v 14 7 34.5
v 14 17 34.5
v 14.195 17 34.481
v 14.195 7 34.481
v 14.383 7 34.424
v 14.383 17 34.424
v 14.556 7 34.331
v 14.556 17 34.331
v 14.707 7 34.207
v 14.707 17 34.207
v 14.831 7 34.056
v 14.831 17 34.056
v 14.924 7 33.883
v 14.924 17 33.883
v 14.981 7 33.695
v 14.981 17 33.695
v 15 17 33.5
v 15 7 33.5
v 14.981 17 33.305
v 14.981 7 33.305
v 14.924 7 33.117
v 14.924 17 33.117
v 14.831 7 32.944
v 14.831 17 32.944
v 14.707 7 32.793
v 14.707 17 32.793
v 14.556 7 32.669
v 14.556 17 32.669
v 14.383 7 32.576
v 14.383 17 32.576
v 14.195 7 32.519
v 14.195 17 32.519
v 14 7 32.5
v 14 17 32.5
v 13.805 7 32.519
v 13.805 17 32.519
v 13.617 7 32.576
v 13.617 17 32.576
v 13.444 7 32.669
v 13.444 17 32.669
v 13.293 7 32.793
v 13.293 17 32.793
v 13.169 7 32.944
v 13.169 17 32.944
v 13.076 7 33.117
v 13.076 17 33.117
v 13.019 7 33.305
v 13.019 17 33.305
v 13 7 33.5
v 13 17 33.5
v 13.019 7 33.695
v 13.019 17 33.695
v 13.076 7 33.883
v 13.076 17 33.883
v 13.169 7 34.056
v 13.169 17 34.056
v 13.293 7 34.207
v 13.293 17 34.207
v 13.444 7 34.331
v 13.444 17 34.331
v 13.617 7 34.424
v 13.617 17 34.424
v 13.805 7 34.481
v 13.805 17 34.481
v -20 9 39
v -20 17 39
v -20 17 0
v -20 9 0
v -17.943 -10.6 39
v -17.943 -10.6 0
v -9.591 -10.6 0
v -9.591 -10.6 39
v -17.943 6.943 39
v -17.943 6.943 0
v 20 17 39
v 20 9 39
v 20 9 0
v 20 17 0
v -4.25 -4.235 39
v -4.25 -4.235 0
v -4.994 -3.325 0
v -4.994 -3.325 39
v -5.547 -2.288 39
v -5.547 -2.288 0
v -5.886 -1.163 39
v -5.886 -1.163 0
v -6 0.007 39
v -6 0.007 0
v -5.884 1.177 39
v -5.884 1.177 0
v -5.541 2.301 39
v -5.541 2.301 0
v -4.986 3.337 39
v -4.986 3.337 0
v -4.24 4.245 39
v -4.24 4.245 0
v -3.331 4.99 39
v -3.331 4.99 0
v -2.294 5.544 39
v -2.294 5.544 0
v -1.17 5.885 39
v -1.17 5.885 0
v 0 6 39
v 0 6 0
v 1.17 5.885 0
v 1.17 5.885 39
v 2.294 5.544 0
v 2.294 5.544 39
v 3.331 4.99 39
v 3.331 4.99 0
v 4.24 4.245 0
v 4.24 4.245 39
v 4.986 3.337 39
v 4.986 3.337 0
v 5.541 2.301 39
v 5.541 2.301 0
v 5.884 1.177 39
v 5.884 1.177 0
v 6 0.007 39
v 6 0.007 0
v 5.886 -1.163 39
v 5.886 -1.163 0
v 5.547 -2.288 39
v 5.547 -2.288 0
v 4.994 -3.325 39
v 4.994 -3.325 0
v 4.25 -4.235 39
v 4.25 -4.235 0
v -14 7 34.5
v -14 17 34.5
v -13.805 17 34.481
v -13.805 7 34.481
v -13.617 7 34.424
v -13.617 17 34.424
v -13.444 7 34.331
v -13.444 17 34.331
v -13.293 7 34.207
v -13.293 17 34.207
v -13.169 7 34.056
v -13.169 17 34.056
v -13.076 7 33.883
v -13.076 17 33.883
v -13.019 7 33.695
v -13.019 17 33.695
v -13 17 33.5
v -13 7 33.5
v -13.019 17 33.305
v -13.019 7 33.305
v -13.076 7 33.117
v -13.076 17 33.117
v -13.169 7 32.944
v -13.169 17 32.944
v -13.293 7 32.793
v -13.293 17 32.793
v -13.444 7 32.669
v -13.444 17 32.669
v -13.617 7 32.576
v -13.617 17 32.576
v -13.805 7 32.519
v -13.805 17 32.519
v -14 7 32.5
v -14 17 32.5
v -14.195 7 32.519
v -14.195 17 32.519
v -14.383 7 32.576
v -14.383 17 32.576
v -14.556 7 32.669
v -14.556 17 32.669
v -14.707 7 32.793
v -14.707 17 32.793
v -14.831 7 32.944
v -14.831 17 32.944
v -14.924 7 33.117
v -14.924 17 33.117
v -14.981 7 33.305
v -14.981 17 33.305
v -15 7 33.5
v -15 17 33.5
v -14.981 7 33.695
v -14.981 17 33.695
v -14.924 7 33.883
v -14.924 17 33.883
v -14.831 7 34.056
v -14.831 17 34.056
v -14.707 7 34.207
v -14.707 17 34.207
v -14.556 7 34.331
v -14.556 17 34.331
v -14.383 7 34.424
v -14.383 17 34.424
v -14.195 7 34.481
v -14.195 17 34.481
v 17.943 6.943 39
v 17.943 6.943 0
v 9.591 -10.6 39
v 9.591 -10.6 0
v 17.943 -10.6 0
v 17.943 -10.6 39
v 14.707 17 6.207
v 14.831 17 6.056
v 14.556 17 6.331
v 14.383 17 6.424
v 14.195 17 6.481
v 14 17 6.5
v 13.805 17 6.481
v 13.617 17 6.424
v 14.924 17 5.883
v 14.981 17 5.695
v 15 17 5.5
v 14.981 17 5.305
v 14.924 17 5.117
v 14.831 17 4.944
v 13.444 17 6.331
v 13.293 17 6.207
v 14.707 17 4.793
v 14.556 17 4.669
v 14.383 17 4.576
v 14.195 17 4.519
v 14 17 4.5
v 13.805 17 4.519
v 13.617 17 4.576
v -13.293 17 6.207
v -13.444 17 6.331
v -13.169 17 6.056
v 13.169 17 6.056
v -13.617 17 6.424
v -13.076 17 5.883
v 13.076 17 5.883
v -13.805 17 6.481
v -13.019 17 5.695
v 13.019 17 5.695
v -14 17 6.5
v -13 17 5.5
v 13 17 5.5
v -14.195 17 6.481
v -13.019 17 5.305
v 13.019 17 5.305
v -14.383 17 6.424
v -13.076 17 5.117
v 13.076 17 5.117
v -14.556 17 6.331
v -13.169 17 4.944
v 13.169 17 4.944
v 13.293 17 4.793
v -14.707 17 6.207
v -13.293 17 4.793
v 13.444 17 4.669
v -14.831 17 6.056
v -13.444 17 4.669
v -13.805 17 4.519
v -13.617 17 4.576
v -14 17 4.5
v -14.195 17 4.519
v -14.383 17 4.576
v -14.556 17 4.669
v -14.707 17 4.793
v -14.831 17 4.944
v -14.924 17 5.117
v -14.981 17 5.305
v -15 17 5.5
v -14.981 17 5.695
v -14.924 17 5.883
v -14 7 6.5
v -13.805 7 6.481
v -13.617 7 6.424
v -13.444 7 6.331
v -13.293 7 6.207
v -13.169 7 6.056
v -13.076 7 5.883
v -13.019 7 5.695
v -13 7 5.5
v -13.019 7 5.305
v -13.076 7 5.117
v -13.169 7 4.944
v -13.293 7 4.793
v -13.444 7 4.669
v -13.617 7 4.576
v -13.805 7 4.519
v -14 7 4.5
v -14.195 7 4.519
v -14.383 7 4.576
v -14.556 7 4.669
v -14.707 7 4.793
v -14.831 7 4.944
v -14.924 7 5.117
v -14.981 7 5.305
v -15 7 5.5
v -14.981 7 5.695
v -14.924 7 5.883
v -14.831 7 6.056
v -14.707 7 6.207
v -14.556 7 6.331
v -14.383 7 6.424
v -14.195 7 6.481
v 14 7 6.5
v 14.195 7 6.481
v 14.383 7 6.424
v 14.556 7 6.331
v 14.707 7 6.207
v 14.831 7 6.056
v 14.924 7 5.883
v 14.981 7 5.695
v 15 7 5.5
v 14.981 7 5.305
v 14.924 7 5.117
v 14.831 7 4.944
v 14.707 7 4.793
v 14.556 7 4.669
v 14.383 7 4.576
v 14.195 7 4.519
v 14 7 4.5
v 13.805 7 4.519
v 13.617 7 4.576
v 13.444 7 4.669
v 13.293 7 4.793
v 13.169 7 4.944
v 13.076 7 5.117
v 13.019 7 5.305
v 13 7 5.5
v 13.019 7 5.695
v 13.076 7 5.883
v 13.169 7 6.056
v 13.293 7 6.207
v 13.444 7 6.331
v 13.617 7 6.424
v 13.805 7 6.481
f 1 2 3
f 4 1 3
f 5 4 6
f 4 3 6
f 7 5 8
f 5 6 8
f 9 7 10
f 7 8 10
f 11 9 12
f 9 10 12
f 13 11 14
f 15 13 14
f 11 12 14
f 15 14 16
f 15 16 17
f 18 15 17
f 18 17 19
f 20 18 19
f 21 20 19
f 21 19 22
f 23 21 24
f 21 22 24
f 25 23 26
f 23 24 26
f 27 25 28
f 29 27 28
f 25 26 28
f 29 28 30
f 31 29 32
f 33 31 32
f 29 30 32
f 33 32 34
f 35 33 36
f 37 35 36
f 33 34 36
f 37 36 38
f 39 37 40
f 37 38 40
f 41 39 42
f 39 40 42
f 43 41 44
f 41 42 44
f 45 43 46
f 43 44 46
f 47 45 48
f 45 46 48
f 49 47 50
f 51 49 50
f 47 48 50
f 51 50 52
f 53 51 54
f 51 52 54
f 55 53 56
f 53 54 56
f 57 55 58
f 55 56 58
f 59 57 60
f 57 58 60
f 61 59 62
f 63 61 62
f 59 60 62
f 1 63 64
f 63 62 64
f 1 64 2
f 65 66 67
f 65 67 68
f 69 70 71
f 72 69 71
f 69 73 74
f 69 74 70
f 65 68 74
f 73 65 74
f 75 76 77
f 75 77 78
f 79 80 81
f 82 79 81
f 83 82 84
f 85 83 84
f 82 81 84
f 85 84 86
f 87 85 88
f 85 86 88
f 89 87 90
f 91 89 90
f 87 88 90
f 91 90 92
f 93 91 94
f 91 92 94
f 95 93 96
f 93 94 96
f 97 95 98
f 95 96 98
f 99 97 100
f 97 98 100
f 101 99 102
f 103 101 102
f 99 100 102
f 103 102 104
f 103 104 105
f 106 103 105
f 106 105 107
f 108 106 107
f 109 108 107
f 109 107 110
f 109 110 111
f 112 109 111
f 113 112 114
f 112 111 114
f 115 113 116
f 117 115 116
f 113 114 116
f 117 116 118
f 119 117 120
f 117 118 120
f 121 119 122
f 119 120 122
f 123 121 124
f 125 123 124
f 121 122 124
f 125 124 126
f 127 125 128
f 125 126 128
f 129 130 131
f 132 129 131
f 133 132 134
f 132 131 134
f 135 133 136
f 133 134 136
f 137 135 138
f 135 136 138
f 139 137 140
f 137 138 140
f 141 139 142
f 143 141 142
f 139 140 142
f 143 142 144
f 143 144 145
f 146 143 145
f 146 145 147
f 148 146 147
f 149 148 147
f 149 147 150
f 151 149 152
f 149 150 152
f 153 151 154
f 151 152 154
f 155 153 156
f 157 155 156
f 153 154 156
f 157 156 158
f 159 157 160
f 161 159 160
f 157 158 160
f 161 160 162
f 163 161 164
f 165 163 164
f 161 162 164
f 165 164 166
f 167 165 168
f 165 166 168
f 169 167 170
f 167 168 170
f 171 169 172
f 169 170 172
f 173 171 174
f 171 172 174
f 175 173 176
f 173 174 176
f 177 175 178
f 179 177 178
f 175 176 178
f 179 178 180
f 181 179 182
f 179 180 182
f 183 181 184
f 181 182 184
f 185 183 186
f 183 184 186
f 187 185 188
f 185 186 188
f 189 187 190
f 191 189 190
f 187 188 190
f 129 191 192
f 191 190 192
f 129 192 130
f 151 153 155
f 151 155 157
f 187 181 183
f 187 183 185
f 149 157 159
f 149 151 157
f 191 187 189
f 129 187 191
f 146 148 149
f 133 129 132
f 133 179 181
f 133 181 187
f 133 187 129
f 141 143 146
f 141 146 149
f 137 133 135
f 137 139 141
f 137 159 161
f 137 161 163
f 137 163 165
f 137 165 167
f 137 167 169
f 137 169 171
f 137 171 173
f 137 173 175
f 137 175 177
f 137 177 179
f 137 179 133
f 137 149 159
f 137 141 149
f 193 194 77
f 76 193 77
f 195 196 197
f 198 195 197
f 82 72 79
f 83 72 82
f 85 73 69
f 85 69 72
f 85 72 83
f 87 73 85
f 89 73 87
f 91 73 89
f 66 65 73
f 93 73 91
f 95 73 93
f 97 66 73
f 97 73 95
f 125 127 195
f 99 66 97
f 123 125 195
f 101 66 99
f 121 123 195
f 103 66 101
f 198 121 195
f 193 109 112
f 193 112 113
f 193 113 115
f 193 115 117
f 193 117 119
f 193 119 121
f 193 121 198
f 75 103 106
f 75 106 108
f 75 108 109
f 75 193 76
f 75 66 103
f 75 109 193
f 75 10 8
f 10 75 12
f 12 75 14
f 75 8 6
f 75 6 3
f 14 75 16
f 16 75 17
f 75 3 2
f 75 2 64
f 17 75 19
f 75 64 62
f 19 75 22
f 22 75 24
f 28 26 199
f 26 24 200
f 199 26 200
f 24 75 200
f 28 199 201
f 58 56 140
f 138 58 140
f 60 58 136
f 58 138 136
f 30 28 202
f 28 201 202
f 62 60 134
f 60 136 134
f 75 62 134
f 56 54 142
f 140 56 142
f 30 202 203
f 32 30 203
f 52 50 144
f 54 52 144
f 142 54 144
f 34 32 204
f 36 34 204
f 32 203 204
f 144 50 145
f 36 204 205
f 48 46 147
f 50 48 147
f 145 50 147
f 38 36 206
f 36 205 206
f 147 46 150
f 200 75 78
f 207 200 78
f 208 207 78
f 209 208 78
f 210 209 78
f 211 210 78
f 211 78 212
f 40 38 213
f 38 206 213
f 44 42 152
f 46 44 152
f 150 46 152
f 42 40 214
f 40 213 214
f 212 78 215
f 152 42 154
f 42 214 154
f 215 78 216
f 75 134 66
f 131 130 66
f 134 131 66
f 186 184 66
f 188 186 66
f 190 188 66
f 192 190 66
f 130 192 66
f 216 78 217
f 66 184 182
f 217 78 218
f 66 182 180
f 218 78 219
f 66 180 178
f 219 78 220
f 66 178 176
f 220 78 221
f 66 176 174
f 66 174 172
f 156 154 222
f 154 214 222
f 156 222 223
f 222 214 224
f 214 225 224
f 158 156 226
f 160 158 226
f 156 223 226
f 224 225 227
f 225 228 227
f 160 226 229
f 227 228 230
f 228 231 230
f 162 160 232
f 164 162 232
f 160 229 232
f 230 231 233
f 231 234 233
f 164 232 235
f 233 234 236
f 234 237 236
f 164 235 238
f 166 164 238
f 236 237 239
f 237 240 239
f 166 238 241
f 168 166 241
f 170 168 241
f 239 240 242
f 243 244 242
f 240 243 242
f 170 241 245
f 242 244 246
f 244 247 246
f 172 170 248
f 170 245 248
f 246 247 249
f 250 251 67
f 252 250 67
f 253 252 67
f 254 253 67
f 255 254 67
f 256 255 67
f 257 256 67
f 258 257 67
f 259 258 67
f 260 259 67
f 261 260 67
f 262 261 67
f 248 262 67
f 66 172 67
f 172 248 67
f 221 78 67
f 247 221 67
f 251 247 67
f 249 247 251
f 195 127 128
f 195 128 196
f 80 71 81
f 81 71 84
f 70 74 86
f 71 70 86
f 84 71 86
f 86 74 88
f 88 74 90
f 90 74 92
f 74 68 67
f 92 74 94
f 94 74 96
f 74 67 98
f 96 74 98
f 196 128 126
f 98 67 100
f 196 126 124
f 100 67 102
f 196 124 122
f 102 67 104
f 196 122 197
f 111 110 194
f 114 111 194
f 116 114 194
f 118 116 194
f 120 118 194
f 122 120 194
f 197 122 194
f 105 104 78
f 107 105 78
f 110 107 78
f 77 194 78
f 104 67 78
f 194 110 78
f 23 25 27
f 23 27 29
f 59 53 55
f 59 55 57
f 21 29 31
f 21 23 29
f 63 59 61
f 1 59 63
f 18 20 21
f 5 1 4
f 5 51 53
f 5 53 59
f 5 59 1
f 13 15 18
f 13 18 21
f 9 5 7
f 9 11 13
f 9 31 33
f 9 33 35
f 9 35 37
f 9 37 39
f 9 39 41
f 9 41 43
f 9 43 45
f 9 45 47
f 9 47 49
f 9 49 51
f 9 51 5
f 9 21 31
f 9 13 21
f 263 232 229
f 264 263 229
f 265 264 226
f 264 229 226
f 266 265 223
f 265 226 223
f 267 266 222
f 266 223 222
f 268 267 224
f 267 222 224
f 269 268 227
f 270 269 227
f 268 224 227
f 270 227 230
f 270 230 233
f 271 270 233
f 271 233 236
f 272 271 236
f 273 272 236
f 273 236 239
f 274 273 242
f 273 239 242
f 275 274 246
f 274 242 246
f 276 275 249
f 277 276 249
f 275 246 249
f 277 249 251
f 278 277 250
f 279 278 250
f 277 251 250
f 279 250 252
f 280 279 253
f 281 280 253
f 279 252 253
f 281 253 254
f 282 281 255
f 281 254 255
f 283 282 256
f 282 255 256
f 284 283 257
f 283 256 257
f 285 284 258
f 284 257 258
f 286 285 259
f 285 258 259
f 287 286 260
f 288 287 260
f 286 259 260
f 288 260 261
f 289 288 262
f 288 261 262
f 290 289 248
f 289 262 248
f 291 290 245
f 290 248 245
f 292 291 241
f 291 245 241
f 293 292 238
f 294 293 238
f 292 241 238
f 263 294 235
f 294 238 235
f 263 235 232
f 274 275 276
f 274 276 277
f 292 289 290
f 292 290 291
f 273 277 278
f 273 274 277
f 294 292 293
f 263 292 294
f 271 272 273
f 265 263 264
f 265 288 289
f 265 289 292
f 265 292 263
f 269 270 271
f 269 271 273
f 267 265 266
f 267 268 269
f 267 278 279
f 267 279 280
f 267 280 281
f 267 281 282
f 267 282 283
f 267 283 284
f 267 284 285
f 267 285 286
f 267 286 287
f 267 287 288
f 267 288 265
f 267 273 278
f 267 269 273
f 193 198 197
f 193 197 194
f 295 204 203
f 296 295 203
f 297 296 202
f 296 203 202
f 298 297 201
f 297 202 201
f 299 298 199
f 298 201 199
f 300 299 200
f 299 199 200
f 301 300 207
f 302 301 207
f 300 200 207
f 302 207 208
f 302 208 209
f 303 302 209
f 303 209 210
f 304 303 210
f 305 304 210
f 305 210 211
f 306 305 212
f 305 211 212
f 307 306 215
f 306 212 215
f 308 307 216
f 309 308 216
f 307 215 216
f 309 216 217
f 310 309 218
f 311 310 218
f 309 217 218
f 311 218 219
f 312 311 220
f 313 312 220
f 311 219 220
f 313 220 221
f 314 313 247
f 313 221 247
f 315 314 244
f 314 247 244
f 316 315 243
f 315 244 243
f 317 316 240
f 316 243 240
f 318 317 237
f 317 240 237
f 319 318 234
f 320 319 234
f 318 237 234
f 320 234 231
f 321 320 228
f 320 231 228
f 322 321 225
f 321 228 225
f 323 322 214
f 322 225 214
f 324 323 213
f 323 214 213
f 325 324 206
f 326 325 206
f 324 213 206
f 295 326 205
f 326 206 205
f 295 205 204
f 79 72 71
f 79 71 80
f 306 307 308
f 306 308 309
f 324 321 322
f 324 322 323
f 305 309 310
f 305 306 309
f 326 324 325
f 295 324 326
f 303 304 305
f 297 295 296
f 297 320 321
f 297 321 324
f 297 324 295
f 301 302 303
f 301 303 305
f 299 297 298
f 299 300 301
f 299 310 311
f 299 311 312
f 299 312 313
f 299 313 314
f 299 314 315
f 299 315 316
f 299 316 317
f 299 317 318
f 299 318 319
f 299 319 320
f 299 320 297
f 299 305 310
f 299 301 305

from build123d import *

# Parameters (mm, degrees)
BOSS_EXTRUDE1_DEPTH = 39
SKETCH2_R           = 1
CUT_EXTRUDE1_DEPTH  = 10


with BuildPart() as part:
    # Sketch1 → Boss-Extrude1 (new body)
    with BuildSketch(Plane.XY):
        with BuildLine():
            Line((20, 17), (-20, 17))
            Line((-20, 17), (-20, 9))
            Line((-20, 9), (-17.943455856, 6.943455856))
            Line((-17.943455856, 6.943455856), (-17.943455856, -10.6))
            Line((-17.943455856, -10.6), (-9.590643782, -10.6))
            Line((-9.590643782, -10.6), (-4.25, -4.235268587))
            ThreePointArc((-4.25, -4.235268587), (0, 6), (4.25, -4.235268587))
            Line((4.25, -4.235268587), (9.590643782, -10.6))
            Line((9.590643782, -10.6), (17.943455856, -10.6))
            Line((17.943455856, -10.6), (17.943455856, 6.943455856))
            Line((17.943455856, 6.943455856), (20, 9))
            Line((20, 9), (20, 17))
        make_face()
    extrude(amount=BOSS_EXTRUDE1_DEPTH)

    # Sketch2 → Cut-Extrude1 (cut)
    with BuildSketch(Plane(origin=(0, 17, 0), x_dir=(1, 0, 0), z_dir=(0, 1, 0))):
        with Locations(Location((-14, -33.5, 0), (0, 0, 270))):
            Circle(SKETCH2_R)
        with Locations(Location((14, -33.5, 0), (0, 0, 270))):
            Circle(SKETCH2_R)
        with Locations(Location((-14, -5.5, 0), (0, 0, 270))):
            Circle(SKETCH2_R)
        with Locations(Location((14, -5.5, 0), (0, 0, 270))):
            Circle(SKETCH2_R)
    extrude(amount=-CUT_EXTRUDE1_DEPTH, mode=Mode.SUBTRACT)


solid = part.part
